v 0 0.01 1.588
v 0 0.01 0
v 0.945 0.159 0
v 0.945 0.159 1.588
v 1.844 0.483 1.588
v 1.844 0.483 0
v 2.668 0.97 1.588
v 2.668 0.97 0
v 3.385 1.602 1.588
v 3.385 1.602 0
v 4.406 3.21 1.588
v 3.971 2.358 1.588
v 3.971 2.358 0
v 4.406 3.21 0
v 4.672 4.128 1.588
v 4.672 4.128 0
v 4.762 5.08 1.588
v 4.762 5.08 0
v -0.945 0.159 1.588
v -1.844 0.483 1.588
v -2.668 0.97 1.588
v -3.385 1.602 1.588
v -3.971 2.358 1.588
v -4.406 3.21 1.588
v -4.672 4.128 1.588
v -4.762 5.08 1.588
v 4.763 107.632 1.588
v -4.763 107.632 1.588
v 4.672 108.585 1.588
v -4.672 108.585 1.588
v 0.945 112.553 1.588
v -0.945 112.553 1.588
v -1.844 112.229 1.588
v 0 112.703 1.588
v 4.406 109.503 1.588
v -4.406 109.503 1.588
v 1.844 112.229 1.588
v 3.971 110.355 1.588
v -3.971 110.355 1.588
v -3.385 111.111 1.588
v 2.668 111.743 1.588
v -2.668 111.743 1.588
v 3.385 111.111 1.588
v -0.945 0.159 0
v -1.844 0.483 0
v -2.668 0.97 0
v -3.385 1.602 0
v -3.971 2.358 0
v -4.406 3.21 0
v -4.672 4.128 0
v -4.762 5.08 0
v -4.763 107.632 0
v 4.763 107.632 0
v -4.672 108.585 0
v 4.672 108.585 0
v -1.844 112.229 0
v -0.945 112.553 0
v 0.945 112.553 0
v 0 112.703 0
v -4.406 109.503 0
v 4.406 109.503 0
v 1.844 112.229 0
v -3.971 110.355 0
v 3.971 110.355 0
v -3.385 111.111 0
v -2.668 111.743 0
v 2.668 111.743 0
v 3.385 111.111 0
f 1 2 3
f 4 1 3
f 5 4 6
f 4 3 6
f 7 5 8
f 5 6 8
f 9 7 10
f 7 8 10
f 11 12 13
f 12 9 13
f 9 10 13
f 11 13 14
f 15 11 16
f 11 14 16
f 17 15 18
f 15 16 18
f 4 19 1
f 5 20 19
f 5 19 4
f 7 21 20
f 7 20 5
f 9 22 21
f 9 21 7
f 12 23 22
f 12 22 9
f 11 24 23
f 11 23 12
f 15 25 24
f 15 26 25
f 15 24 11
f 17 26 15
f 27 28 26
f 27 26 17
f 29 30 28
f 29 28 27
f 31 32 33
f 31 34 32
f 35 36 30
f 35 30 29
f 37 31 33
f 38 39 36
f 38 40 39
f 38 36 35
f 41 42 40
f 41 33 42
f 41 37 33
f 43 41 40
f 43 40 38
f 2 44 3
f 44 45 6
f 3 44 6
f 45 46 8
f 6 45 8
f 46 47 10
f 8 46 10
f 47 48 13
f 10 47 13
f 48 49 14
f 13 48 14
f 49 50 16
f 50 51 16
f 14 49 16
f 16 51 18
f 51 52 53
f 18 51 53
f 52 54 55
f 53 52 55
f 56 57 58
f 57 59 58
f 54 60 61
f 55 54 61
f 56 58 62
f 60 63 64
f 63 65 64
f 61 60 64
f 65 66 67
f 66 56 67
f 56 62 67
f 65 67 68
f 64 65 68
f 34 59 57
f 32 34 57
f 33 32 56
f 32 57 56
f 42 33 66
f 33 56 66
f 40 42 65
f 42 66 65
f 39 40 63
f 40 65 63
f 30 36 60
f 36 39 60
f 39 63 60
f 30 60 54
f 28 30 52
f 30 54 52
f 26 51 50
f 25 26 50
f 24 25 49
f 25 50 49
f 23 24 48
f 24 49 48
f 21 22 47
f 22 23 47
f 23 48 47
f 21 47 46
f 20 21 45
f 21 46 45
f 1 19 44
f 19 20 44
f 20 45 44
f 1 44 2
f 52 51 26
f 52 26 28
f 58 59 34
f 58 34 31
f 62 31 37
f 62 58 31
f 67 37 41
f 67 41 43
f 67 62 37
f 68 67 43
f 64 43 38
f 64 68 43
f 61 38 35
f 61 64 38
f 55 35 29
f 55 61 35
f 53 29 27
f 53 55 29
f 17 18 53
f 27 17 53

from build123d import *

# Parameters (mm, degrees)
F0_W        = 9.525
F0_H        = 112.7125
F1_DEPTH    = 1.5875
F2_T1_DEPTH = 26.9875


# Not quite as in the source:
# - a fillet or chamfer that OpenCascade refuses, or shapes differently, is made with other operations: its cross-section is extruded or revolved along the edge and cut away or added


with BuildPart() as f1:
    # F0 (on Top) → F1 (new body)
    with BuildSketch(Plane.XY):
        with Locations((0, 56.35625)):
            Rectangle(F0_W, F0_H)
    extrude(amount=F1_DEPTH)

    # F2: fillet of radius 5.08 on 4 edges, made by hand

    # F2_s2 → F2_t1 (cut)
    with BuildSketch(Plane.XY.offset(-12.7)):
        with BuildLine():
            ThreePointArc((-0.3175, 0), (3.2746024484, 1.4878975516), (4.7625, 5.08))
            Line((4.7625, 5.08), (4.7625, 0))
            Line((4.7625, 0), (-0.3175, 0))
        make_face()
        with BuildLine():
            ThreePointArc((-4.7625, 5.08), (-3.2746024484, 1.4878975516), (0.3175, 0))
            Line((0.3175, 0), (-4.7625, 0))
            Line((-4.7625, 0), (-4.7625, 5.08))
        make_face()
        with BuildLine():
            ThreePointArc((-0.3175, 112.7125), (3.2746024484, 111.2246024484), (4.7625, 107.6325))
            Line((4.7625, 107.6325), (4.7625, 112.7125))
            Line((4.7625, 112.7125), (-0.3175, 112.7125))
        make_face()
        with BuildLine():
            ThreePointArc((0.3175, 112.7125), (-3.2746024484, 111.2246024484), (-4.7625, 107.6325))
            Line((-4.7625, 107.6325), (-4.7625, 112.7125))
            Line((-4.7625, 112.7125), (0.3175, 112.7125))
        make_face()
    extrude(amount=F2_T1_DEPTH, mode=Mode.SUBTRACT)


solid = f1.part
